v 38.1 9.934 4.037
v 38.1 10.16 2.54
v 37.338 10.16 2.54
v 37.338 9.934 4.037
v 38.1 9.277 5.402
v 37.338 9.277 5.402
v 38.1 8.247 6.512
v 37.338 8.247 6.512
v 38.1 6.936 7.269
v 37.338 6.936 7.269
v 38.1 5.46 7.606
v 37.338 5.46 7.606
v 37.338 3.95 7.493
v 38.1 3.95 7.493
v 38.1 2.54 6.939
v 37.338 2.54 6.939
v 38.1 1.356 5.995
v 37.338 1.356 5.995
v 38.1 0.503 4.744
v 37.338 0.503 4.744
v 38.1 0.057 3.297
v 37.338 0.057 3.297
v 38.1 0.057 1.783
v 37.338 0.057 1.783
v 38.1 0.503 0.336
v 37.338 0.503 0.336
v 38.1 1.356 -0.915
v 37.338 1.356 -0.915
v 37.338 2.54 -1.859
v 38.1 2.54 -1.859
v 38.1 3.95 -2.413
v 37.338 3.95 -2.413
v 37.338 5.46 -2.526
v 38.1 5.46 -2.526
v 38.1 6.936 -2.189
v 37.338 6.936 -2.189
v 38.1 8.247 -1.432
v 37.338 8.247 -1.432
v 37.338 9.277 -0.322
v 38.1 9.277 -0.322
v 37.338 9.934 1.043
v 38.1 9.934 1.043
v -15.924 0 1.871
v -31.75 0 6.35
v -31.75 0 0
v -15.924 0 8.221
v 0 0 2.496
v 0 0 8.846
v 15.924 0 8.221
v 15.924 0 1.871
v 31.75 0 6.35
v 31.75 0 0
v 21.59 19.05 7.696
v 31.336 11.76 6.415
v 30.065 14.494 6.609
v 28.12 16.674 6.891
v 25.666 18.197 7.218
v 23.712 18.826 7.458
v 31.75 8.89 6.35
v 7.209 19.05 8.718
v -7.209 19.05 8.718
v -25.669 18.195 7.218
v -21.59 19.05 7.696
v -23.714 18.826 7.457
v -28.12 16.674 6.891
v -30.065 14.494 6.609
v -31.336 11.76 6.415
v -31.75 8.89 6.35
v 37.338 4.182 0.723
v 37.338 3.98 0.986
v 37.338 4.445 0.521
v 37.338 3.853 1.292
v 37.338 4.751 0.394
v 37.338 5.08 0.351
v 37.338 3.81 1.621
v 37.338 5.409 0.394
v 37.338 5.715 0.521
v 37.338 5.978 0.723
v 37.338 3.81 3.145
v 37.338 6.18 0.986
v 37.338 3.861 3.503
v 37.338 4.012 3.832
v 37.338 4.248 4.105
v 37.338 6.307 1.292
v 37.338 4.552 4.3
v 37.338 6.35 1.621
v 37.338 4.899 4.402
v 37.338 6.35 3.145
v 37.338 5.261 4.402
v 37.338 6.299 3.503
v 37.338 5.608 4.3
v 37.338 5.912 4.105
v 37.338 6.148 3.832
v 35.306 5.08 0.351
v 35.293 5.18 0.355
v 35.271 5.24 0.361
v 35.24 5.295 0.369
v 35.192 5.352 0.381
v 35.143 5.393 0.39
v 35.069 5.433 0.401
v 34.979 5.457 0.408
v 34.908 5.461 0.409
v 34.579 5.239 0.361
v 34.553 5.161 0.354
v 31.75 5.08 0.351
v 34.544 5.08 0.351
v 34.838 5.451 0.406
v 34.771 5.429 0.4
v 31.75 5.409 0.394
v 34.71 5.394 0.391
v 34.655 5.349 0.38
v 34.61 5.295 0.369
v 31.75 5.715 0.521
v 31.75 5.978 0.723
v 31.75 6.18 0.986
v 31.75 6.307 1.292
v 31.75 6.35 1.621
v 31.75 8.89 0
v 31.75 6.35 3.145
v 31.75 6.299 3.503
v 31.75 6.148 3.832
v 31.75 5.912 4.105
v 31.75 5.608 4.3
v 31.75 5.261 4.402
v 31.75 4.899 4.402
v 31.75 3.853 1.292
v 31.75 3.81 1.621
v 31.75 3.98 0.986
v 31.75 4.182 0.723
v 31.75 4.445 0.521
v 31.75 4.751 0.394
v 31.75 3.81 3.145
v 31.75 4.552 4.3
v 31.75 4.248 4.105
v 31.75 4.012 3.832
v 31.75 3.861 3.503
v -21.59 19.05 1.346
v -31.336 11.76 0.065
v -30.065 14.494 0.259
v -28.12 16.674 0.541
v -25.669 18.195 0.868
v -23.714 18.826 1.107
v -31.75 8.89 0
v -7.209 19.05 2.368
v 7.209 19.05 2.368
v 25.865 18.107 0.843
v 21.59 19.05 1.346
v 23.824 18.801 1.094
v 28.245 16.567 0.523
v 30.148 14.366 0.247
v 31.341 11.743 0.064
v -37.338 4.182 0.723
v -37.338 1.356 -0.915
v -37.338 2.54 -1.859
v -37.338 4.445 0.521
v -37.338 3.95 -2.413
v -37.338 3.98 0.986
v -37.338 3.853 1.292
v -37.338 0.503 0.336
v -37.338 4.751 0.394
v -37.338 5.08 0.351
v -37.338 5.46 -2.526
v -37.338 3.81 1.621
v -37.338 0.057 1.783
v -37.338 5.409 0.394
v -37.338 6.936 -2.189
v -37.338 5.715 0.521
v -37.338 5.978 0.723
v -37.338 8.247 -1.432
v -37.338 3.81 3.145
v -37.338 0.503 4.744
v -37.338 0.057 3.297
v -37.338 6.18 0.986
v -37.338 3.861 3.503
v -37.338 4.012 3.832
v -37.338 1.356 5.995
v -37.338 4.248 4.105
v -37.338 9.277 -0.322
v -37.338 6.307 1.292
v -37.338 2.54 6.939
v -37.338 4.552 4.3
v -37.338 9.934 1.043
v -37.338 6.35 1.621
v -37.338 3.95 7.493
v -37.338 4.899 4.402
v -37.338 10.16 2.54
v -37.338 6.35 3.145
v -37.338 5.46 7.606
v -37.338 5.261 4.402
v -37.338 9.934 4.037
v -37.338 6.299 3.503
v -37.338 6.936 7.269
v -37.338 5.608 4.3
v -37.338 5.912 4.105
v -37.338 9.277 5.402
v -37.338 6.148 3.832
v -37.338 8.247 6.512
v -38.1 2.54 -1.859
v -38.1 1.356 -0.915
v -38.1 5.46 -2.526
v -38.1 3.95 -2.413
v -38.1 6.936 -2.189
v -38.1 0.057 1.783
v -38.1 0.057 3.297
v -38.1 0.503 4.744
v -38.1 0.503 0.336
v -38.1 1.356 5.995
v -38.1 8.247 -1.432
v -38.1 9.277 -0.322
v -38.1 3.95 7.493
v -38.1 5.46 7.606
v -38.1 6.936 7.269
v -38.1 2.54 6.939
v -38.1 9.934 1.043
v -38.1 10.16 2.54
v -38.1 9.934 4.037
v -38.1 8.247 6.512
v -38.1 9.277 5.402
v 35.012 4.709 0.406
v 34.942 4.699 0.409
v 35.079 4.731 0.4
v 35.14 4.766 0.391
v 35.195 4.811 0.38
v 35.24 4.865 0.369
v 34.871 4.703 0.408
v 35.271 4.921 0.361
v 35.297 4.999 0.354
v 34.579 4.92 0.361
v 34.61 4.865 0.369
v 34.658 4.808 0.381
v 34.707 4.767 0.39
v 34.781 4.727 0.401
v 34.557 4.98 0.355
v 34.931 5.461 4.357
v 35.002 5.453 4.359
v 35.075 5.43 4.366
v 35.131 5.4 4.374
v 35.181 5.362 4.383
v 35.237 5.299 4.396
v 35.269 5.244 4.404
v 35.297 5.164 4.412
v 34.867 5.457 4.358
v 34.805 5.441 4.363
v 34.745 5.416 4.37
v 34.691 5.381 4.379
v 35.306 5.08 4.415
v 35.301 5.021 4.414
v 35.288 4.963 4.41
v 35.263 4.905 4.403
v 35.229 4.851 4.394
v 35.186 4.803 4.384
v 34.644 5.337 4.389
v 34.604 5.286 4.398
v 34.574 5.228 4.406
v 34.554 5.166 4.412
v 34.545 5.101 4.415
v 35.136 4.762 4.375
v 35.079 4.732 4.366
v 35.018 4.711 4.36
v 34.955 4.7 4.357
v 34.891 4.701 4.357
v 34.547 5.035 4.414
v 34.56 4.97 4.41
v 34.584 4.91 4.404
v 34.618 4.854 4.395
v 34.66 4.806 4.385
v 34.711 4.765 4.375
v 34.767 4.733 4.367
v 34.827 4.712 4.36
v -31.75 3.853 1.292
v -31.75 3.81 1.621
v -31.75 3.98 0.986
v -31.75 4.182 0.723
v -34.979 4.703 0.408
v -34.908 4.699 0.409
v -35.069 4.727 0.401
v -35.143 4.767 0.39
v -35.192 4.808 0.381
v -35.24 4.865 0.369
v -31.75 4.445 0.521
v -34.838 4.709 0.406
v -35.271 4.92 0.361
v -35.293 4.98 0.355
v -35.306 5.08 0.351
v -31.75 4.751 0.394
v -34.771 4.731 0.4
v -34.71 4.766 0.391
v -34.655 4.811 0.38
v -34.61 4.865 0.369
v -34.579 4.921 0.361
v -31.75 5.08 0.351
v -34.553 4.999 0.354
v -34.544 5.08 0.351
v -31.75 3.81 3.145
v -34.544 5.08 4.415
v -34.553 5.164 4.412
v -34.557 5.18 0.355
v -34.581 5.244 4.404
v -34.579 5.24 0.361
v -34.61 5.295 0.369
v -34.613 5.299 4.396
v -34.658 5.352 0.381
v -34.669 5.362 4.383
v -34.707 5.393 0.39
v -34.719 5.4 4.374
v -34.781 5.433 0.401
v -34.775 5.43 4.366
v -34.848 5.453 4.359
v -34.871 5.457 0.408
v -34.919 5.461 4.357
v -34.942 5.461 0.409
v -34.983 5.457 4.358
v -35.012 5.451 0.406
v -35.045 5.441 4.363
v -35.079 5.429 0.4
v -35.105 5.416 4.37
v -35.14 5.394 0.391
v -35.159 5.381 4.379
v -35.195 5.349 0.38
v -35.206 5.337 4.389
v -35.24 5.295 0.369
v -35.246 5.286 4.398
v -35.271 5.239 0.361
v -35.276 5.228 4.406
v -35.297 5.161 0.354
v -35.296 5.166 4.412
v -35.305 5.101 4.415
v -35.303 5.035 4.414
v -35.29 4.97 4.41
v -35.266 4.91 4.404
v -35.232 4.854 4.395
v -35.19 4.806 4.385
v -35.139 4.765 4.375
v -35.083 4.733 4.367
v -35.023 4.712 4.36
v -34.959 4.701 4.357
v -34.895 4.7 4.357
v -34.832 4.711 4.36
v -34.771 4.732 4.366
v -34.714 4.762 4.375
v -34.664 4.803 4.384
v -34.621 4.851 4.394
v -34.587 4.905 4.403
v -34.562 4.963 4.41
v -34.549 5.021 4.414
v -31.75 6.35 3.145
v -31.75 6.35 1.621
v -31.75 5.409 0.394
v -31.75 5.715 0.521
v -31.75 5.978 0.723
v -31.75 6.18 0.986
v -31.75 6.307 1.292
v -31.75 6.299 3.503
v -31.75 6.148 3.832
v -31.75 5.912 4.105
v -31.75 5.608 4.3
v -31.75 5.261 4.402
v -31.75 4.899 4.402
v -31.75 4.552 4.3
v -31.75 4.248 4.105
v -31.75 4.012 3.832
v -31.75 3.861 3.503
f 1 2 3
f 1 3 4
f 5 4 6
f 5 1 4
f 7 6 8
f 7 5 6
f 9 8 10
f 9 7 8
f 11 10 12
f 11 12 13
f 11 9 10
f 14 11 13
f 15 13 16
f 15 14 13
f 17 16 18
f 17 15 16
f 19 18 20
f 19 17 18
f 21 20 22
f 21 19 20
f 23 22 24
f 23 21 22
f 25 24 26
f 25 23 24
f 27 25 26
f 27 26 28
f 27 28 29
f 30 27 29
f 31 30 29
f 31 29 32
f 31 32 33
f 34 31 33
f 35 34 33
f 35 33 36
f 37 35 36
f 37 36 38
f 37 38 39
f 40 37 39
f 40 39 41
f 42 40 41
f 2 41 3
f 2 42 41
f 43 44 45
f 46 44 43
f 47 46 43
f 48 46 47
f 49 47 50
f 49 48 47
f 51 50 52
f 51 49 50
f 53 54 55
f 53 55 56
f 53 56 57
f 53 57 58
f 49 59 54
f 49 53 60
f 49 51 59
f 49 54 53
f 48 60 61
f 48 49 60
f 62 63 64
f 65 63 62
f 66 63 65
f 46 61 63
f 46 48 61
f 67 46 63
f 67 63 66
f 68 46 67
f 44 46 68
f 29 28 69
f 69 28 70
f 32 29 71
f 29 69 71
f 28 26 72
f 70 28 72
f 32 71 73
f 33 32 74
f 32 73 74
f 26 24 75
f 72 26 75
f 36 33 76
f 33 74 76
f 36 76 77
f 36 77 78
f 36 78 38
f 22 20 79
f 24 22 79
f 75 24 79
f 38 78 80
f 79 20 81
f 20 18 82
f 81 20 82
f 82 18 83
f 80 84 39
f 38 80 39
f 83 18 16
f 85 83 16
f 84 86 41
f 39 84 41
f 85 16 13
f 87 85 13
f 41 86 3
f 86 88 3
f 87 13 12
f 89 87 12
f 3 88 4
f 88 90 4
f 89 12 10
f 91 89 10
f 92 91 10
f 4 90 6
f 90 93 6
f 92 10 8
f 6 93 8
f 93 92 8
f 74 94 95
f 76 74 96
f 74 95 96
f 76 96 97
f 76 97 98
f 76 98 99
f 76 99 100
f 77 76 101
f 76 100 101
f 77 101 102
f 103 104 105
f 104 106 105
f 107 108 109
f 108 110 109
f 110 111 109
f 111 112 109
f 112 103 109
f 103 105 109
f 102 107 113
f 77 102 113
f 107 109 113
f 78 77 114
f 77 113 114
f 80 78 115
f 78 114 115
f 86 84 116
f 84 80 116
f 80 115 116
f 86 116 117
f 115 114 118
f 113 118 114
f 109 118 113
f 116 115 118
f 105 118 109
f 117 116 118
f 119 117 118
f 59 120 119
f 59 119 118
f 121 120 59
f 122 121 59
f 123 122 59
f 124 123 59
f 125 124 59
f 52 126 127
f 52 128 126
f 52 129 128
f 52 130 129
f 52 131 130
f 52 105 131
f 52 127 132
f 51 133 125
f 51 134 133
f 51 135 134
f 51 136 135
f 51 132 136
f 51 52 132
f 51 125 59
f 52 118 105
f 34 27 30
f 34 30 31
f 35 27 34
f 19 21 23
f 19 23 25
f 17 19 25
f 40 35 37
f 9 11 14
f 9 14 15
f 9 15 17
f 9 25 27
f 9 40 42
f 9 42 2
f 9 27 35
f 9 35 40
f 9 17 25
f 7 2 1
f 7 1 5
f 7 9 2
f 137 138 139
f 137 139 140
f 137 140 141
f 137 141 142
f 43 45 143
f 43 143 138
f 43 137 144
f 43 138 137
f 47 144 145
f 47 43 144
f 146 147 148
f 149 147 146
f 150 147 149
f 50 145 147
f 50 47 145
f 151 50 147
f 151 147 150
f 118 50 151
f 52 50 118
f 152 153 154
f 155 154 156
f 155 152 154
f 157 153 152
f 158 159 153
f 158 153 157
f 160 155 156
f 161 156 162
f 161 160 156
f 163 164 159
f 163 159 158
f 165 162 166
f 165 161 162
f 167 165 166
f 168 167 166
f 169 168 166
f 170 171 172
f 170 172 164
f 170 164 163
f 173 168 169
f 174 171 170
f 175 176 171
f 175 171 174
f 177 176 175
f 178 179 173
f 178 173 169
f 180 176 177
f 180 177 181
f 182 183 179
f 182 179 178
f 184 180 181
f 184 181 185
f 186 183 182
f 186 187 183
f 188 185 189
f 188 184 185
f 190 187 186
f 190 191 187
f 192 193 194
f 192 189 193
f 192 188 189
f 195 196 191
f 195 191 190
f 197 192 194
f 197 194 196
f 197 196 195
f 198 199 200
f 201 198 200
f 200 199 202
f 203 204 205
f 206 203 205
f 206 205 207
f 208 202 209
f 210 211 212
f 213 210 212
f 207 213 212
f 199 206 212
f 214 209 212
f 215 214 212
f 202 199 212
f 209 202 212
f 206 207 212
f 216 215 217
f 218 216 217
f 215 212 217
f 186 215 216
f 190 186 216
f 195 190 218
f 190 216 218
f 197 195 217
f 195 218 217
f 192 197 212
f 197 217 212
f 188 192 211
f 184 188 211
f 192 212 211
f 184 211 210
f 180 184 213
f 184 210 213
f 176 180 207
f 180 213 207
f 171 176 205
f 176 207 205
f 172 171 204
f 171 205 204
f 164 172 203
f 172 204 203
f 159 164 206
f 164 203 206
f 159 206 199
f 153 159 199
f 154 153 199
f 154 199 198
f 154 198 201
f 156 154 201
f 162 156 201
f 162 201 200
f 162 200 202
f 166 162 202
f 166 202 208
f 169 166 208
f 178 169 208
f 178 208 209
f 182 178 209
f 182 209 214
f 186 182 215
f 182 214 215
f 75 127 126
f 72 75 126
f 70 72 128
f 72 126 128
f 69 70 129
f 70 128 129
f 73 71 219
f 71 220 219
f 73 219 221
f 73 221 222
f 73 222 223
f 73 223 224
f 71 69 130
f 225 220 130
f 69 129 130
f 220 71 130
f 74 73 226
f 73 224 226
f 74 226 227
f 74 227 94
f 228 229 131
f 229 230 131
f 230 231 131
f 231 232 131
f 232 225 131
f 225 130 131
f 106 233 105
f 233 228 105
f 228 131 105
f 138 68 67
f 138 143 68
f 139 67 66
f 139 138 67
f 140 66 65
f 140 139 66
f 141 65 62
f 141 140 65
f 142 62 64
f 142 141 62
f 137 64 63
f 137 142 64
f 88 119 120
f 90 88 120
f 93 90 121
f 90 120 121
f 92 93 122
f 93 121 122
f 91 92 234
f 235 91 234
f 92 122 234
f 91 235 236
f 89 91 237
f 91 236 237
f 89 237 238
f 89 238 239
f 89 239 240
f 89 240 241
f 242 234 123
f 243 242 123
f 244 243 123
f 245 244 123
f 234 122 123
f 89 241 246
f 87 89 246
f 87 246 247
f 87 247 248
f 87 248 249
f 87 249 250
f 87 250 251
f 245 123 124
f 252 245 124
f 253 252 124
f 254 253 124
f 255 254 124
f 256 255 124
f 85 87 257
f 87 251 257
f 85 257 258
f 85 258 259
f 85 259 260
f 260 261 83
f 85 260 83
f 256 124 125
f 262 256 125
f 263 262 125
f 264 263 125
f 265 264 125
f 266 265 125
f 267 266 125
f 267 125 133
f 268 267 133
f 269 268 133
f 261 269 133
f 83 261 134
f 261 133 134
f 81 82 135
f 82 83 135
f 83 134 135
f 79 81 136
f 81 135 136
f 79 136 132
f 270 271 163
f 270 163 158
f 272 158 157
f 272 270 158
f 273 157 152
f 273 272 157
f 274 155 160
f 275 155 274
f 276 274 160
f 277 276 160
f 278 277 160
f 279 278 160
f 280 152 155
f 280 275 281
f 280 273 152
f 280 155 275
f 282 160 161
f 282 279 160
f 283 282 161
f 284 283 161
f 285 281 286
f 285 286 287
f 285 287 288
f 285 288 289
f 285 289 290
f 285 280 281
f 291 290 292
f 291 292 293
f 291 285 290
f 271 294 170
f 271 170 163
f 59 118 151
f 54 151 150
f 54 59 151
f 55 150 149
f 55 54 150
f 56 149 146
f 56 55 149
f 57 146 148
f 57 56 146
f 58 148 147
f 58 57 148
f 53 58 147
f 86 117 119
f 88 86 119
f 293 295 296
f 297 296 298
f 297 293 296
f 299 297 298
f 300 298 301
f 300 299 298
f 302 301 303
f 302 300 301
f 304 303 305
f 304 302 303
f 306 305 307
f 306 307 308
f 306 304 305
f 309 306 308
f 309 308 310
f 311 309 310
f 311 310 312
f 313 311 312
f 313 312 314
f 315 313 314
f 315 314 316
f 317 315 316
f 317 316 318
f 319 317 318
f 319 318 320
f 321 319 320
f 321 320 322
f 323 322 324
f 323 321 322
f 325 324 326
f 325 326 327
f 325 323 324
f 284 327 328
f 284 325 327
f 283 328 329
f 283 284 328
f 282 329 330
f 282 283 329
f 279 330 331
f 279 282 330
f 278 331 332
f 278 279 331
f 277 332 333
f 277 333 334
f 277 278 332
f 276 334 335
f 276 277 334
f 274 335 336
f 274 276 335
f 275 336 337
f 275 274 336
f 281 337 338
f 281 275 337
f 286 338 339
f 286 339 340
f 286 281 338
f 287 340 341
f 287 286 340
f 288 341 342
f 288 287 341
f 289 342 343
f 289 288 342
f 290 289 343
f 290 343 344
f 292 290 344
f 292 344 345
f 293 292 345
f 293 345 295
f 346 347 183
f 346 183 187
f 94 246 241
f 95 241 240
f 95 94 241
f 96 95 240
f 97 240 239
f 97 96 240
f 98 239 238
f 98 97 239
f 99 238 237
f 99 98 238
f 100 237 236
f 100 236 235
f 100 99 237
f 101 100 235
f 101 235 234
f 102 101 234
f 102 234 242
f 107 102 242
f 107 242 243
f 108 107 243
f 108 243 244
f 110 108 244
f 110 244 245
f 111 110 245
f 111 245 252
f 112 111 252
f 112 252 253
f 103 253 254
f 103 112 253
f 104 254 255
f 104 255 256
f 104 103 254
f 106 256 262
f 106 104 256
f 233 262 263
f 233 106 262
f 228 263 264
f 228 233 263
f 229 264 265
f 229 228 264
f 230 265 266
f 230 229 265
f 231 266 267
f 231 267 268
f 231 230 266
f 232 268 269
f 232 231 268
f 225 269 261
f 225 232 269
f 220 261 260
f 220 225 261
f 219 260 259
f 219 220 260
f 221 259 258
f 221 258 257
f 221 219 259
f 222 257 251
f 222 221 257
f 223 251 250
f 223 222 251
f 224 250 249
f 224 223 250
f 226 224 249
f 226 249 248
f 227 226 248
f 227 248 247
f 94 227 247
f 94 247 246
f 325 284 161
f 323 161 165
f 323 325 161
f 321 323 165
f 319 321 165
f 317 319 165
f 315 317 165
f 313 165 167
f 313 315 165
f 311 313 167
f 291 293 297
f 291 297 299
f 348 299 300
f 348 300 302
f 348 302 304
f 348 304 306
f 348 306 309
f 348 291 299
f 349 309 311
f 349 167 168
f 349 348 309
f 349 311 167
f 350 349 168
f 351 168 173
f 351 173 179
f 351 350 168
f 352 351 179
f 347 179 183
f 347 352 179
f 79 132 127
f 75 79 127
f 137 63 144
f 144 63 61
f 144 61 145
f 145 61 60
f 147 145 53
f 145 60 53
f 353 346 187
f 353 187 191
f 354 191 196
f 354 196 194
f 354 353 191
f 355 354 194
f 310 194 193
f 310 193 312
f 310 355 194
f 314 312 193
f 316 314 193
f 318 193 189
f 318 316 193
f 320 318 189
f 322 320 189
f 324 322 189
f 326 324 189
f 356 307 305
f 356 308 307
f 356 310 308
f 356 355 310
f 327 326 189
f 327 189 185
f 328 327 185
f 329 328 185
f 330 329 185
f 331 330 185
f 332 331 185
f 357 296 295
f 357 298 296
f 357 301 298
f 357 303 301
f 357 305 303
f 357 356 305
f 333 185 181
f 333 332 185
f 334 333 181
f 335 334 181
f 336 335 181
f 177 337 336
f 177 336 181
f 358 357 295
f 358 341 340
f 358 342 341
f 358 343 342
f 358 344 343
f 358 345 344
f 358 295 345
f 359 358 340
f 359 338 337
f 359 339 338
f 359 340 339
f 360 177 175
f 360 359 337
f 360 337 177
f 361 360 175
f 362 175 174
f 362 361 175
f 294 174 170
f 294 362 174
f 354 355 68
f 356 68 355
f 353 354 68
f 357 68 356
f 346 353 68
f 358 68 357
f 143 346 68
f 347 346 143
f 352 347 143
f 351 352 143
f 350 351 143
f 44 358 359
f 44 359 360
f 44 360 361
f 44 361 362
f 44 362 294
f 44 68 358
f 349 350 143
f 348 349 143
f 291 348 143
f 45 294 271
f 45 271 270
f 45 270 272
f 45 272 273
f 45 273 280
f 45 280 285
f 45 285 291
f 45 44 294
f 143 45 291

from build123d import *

# Parameters (mm, degrees)
F1_DEPTH  = 19.05
F2_R      = 10.16
F5_DEPTH  = 6.35
F6_DEPTH  = 69.85
F8_DEPTH  = 25.4
F10_R     = 5.08
F11_DEPTH = 0.762
F13_R     = 5.08
F14_DEPTH = 0.762
F15_R     = 0.381
F16_DEPTH = 25.4


with BuildPart() as f1:
    # F0 (on Front) → F1 (new body)
    with BuildSketch(Plane.XZ):
        with BuildLine():
            Line((31.75, 0), (31.75, 6.35))
            ThreePointArc((31.75, 6.35), (0, 8.845796), (-31.75, 6.35))
            Line((-31.75, 6.35), (-31.75, 0))
            ThreePointArc((-31.75, 0), (0, 2.495796), (31.75, 0))
        make_face()
    extrude(amount=-F1_DEPTH)

    # F2
    f2_edges = [f1.edges().sort_by_distance(p)[0] for p in [
        (-31.75, 19.05, 3.175),
        (31.75, 19.05, 3.175),
    ]]
    fillet(f2_edges, radius=F2_R)

    # F4 (on offset) → F5 (join)
    with BuildSketch(Plane.YZ.offset(31.75)):
        with BuildLine():
            Line((6.35, 1.621048), (6.35, 3.145058))
            ThreePointArc((6.35, 3.145058), (5.08, 4.415058), (3.81, 3.145058))
            Line((3.81, 3.145058), (3.81, 1.621048))
            ThreePointArc((3.81, 1.621048), (4.181974, 0.723023), (5.08, 0.351048))
            ThreePointArc((5.08, 0.351048), (5.978026, 0.723023), (6.35, 1.621048))
        make_face()
    extrude(amount=F5_DEPTH)

    # F4 (on offset) → F6 (join)
    with BuildSketch(Plane.YZ.offset(31.75)):
        with BuildLine():
            Line((6.35, 1.621048), (6.35, 3.145058))
            ThreePointArc((6.35, 3.145058), (5.08, 4.415058), (3.81, 3.145058))
            Line((3.81, 3.145058), (3.81, 1.621048))
            ThreePointArc((3.81, 1.621048), (4.181974, 0.723023), (5.08, 0.351048))
            ThreePointArc((5.08, 0.351048), (5.978026, 0.723023), (6.35, 1.621048))
        make_face()
    extrude(amount=-F6_DEPTH)

    # F7 (on Front) → F8 (cut)
    with BuildSketch(Plane.XZ):
        with BuildLine():
            Line((-31.75, 0), (31.75, 0))
            ThreePointArc((31.75, 0), (0, 2.495796), (-31.75, 0))
        make_face()
    extrude(amount=-F8_DEPTH, mode=Mode.SUBTRACT)

    # F10 (on offset) → F11 (join)
    with BuildSketch(Plane.YZ.offset(-38.1)):
        with Locations((5.08, 2.54)):
            Circle(F10_R)
    extrude(amount=F11_DEPTH)

    # F13 (on offset) → F14 (join)
    with BuildSketch(Plane.YZ.offset(38.1)):
        with Locations((5.08, 2.54)):
            Circle(F13_R)
    extrude(amount=-F14_DEPTH)

    # F15 (on Top) → F16 (cut)
    with BuildSketch(Plane.XY):
        with Locations((34.925, 5.08)):
            Circle(F15_R)
        with Locations((-34.925, 5.08)):
            Circle(F15_R)
    extrude(amount=F16_DEPTH, mode=Mode.SUBTRACT)


solid = f1.part
